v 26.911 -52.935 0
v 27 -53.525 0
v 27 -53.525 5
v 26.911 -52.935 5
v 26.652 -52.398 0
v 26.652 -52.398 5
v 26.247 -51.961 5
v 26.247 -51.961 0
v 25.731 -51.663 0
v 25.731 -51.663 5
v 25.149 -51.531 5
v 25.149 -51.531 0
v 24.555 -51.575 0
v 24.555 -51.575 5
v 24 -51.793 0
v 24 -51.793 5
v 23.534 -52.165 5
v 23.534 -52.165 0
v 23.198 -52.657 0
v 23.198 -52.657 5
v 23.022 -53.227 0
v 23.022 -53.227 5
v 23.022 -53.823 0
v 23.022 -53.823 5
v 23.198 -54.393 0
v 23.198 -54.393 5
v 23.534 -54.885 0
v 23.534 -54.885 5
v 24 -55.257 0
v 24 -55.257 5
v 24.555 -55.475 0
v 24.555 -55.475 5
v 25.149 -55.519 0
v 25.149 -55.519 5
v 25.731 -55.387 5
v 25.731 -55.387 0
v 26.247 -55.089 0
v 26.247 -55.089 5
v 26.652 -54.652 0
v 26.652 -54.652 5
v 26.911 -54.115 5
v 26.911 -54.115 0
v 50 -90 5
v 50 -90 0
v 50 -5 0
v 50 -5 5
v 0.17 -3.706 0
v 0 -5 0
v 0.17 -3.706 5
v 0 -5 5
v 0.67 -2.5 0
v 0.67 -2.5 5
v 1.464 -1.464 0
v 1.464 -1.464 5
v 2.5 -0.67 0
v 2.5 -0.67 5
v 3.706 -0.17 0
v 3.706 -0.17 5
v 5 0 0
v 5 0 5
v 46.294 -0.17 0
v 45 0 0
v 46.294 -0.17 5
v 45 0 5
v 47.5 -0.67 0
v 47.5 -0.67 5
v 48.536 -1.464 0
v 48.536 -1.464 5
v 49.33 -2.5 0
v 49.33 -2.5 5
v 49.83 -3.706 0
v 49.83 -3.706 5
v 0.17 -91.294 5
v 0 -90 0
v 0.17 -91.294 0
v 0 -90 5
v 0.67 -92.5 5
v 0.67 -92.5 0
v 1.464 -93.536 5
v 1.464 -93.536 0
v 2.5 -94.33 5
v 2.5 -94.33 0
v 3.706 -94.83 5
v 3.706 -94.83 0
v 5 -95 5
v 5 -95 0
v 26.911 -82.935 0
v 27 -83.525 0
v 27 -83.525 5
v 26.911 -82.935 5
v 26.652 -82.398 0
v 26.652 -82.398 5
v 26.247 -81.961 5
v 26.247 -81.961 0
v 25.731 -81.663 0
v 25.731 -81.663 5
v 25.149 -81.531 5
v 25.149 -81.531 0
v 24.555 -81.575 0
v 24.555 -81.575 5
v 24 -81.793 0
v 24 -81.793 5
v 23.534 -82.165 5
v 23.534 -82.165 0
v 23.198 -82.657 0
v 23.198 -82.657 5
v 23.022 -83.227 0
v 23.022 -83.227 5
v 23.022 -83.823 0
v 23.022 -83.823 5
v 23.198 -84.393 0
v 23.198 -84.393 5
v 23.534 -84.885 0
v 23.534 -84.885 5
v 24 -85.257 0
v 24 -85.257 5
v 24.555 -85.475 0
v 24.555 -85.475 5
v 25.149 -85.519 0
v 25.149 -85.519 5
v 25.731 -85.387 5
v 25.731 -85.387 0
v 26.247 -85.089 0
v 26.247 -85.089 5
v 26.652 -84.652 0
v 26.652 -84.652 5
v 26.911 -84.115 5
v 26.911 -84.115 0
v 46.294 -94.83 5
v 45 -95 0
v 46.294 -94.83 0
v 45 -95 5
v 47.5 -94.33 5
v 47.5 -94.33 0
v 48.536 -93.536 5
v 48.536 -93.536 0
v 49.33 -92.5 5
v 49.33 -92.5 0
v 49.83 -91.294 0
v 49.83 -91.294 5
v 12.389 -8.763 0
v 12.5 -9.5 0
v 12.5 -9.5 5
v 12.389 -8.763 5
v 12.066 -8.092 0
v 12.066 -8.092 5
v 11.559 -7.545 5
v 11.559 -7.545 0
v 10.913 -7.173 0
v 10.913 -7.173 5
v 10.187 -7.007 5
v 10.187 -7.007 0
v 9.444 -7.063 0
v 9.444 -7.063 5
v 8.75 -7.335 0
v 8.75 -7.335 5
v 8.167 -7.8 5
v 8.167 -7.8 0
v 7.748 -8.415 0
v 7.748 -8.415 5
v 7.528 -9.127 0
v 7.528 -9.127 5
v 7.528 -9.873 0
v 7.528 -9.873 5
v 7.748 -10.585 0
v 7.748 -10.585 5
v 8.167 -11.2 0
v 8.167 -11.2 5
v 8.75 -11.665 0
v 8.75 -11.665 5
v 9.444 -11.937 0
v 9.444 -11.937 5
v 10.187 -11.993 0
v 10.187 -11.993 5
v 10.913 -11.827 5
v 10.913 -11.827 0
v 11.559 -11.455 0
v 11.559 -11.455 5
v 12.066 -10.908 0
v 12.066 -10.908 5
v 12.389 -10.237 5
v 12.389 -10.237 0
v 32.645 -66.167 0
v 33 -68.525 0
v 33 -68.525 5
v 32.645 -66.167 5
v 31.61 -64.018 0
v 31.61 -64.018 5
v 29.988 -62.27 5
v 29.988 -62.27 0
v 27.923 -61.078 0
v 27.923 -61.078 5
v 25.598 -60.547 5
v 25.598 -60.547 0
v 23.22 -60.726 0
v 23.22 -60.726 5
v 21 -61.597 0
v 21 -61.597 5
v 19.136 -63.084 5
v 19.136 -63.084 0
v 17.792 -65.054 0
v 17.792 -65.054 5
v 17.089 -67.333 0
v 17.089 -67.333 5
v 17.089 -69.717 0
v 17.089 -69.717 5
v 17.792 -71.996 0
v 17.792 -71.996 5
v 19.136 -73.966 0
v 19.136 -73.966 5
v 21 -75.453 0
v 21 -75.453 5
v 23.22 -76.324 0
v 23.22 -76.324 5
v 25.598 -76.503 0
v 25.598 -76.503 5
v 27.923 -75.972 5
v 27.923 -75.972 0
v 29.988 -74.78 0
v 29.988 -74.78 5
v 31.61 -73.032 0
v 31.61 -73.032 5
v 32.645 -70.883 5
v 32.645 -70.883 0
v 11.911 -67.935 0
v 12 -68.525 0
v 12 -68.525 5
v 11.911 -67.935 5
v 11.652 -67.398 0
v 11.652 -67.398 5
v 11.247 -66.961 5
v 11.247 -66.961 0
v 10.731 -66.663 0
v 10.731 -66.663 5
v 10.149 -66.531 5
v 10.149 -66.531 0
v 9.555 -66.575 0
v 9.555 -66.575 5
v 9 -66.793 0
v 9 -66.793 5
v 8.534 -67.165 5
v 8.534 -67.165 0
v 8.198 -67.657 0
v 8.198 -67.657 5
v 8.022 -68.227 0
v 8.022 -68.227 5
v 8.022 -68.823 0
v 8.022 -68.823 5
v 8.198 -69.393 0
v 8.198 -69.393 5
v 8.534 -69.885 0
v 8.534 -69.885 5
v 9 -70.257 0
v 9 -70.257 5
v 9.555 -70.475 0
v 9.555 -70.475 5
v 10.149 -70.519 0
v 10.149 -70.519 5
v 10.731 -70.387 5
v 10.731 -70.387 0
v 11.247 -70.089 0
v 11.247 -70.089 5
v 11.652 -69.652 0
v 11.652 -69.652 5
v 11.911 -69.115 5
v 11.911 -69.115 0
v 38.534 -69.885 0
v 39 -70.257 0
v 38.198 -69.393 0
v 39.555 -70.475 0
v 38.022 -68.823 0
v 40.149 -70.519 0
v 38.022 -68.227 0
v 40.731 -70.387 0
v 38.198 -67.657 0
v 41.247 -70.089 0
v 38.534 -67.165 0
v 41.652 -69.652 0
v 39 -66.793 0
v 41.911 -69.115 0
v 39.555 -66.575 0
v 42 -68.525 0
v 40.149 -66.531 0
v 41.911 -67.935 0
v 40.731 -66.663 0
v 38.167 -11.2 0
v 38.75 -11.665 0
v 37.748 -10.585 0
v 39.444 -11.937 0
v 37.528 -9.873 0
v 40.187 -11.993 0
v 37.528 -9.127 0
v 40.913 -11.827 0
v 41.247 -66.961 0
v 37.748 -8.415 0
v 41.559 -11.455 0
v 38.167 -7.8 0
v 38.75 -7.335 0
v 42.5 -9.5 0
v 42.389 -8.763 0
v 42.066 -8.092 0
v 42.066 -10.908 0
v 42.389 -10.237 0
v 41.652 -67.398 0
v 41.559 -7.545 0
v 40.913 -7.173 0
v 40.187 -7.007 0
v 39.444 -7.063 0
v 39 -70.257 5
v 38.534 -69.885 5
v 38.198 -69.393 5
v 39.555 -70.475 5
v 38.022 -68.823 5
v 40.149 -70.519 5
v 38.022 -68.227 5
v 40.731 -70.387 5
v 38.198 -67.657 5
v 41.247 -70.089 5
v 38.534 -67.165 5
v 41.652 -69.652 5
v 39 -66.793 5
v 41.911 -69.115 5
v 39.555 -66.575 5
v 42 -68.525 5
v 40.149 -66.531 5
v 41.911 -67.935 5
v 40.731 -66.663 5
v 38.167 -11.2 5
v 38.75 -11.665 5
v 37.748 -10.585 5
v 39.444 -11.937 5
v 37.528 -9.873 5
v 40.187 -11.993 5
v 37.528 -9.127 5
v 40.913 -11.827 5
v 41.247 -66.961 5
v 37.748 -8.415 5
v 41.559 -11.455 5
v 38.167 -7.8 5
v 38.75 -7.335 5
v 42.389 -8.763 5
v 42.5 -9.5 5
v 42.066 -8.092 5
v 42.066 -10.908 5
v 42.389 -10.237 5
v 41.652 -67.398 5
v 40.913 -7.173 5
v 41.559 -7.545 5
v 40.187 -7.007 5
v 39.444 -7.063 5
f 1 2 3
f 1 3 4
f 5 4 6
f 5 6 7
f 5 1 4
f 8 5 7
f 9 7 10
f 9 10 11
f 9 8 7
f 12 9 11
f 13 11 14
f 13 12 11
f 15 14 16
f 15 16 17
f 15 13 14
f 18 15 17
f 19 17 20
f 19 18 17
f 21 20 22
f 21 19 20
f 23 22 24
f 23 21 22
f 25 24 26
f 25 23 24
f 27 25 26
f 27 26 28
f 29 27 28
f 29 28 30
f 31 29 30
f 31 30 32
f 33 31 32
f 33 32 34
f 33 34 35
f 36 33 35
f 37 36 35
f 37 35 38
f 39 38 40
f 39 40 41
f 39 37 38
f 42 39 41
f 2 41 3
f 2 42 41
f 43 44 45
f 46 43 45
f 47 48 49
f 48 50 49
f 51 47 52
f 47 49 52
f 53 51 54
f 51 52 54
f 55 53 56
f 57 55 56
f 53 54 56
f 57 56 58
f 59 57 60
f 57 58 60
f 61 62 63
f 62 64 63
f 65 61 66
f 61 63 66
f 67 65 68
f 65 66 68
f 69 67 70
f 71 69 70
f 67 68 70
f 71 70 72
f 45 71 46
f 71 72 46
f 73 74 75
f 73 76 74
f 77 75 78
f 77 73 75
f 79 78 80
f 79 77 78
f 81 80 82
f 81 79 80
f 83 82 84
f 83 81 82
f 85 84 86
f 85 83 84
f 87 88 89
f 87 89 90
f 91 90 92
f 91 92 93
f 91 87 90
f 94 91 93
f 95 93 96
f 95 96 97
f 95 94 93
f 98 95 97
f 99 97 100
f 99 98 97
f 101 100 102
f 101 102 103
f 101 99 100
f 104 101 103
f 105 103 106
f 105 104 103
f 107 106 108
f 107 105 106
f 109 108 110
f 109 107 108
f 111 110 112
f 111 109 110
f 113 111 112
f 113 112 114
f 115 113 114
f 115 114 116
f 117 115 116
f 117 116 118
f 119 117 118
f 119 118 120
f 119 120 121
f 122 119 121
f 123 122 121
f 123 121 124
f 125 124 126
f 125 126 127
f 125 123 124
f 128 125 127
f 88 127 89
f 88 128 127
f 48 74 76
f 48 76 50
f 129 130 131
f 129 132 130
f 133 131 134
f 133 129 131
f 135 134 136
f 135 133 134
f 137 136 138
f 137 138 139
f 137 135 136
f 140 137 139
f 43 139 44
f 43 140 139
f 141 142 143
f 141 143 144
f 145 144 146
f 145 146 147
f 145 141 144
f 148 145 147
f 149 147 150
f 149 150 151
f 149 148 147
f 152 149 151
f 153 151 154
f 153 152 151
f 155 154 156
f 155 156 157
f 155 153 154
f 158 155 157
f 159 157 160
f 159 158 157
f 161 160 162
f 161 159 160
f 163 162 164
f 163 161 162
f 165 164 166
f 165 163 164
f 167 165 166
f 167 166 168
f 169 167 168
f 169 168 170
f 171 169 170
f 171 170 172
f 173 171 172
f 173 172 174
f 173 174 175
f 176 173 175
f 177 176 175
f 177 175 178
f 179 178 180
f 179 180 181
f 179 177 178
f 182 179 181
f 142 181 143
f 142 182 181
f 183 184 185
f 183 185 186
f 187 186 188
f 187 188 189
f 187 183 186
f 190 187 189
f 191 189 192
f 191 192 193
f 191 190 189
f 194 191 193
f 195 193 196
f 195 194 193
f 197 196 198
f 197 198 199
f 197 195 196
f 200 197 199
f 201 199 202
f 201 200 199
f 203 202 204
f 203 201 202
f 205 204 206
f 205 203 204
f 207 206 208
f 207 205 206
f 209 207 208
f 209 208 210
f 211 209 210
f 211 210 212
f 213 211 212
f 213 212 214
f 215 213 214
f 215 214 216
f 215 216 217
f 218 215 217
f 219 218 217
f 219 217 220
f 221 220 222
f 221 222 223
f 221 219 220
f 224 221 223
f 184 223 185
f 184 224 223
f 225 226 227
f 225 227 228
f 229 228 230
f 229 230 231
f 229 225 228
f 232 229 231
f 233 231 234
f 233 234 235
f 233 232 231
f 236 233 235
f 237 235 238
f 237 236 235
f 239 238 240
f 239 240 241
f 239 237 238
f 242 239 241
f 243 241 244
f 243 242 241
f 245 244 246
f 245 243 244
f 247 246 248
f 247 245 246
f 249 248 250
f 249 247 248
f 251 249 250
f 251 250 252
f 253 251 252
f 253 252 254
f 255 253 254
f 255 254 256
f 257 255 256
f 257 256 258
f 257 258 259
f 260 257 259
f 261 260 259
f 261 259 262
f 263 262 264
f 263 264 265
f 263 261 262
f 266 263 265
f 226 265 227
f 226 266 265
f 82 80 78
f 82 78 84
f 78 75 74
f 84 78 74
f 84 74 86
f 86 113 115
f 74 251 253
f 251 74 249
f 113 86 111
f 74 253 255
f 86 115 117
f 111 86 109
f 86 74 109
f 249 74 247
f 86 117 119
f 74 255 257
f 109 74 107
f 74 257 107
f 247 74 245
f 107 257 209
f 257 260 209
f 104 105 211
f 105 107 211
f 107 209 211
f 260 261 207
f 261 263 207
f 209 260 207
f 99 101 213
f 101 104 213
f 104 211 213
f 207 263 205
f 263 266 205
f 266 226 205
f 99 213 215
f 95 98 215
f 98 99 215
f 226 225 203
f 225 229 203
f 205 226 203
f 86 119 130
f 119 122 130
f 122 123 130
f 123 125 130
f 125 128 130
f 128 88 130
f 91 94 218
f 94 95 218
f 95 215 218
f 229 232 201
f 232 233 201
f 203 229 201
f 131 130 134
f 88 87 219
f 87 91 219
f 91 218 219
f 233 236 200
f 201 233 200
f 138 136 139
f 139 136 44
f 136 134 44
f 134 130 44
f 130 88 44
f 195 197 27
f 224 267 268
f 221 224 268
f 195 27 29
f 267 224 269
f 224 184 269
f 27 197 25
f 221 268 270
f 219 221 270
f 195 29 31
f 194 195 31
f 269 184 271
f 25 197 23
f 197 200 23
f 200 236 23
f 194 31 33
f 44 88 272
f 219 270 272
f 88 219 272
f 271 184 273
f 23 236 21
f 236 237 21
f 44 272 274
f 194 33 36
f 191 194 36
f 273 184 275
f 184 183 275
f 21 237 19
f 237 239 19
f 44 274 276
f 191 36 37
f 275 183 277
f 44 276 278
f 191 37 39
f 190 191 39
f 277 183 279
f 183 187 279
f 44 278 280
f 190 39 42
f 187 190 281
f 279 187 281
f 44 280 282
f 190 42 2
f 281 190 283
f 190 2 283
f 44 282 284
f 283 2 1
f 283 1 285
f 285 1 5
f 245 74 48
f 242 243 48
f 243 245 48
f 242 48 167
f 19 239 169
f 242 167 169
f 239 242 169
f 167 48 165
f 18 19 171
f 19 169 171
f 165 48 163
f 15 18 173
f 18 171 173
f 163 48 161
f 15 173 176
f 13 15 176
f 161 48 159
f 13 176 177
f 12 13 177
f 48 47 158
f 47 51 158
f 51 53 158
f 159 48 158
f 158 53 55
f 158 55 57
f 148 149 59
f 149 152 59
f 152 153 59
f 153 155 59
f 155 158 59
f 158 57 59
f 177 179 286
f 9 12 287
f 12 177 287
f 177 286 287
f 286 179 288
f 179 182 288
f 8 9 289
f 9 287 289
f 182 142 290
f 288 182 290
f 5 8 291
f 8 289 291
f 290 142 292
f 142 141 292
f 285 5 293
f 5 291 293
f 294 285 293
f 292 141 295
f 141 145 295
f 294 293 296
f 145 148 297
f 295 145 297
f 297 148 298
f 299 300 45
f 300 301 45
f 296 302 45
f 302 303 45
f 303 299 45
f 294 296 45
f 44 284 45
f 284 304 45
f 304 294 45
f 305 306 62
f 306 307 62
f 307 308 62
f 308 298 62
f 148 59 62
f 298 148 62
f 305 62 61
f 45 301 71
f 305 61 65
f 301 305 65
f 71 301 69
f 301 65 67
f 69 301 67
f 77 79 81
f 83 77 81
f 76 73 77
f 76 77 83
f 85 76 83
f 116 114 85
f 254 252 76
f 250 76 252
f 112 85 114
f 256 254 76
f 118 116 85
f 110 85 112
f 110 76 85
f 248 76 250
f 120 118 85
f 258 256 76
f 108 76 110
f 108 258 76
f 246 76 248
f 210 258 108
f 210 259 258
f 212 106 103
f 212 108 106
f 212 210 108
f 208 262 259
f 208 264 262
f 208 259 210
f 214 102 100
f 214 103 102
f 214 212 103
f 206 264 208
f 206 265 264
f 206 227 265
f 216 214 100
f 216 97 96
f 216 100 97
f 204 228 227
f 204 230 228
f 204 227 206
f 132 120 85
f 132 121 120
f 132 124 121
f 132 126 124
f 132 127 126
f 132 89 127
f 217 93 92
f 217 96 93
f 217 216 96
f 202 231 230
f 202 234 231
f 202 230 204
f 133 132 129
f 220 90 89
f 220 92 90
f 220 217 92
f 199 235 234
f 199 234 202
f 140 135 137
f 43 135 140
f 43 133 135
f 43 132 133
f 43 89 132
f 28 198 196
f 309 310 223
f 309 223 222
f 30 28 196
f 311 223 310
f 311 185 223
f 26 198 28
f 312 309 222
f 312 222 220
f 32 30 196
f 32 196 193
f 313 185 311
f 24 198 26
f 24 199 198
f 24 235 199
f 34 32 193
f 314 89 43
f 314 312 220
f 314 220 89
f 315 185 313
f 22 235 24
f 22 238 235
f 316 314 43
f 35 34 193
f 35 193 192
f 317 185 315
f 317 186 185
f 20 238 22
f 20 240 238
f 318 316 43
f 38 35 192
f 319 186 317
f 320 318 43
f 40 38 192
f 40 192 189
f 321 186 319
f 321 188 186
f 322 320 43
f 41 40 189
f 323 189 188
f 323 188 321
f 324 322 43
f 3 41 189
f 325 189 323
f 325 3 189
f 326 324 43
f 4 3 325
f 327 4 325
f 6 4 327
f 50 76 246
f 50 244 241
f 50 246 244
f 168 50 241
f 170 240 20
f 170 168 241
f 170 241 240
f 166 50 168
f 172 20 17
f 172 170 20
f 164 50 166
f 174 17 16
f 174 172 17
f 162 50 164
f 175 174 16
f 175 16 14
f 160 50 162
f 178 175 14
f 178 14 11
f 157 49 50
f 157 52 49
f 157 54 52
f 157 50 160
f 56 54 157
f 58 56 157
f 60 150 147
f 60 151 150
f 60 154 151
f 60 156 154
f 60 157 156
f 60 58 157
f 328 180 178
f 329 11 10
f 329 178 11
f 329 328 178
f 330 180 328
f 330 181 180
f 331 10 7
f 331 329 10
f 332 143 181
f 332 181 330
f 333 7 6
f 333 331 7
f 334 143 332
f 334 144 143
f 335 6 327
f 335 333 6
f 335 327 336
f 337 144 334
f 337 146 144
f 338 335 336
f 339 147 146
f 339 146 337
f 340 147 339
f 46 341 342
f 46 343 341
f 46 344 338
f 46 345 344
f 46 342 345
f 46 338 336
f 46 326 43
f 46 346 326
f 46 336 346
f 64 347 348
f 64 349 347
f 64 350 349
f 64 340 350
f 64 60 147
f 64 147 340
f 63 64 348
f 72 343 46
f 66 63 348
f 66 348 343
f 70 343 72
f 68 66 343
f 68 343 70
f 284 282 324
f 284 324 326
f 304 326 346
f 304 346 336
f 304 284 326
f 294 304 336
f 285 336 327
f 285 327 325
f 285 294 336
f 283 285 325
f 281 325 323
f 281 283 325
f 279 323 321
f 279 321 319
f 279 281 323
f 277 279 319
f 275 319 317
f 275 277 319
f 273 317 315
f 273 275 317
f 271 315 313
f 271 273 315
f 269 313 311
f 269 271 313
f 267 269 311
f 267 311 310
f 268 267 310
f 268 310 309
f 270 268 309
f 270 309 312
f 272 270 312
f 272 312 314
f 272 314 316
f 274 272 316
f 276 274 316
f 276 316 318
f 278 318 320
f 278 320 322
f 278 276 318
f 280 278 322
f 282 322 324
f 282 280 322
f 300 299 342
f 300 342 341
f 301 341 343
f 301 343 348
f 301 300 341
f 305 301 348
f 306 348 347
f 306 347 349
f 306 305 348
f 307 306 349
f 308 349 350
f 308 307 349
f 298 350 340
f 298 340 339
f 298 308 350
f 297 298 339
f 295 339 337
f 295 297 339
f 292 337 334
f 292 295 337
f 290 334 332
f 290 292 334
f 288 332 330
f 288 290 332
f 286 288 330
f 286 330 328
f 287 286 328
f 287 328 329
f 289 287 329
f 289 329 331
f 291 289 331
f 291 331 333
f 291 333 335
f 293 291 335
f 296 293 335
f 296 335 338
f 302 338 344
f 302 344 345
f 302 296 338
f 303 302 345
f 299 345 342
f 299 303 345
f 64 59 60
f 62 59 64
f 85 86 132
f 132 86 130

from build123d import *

# Parameters (mm, degrees)
SKETCH1_W           = 50
SKETCH1_H           = 95
SKETCH1_R           = 2.5
SKETCH1_R_2         = 8
SKETCH1_R_3         = 2
BOSS_EXTRUDE1_DEPTH = 5
FILLET1_R           = 5


with BuildPart() as part:
    # Sketch1 → Boss-Extrude1 (new body)
    with BuildSketch(Plane.XY):
        with Locations((25, -47.5)):
            Rectangle(SKETCH1_W, SKETCH1_H)
        with Locations((10, -9.5)):
            Circle(SKETCH1_R, mode=Mode.SUBTRACT)
        with Locations((40, -9.5)):
            Circle(SKETCH1_R, mode=Mode.SUBTRACT)
        with Locations((25, -68.525)):
            Circle(SKETCH1_R_2, mode=Mode.SUBTRACT)
        with Locations((25, -53.525)):
            Circle(SKETCH1_R_3, mode=Mode.SUBTRACT)
        with Locations((40, -68.525)):
            Circle(SKETCH1_R_3, mode=Mode.SUBTRACT)
        with Locations((25, -83.525)):
            Circle(SKETCH1_R_3, mode=Mode.SUBTRACT)
        with Locations((10, -68.525)):
            Circle(SKETCH1_R_3, mode=Mode.SUBTRACT)
    extrude(amount=BOSS_EXTRUDE1_DEPTH)

    # Fillet1
    fillet1_edges = [part.edges().sort_by_distance(p)[0] for p in [
        (0, 0, 2.5),
        (50, 0, 2.5),
        (50, -95, 2.5),
        (0, -95, 2.5),
    ]]
    fillet(fillet1_edges, radius=FILLET1_R)


solid = part.part
